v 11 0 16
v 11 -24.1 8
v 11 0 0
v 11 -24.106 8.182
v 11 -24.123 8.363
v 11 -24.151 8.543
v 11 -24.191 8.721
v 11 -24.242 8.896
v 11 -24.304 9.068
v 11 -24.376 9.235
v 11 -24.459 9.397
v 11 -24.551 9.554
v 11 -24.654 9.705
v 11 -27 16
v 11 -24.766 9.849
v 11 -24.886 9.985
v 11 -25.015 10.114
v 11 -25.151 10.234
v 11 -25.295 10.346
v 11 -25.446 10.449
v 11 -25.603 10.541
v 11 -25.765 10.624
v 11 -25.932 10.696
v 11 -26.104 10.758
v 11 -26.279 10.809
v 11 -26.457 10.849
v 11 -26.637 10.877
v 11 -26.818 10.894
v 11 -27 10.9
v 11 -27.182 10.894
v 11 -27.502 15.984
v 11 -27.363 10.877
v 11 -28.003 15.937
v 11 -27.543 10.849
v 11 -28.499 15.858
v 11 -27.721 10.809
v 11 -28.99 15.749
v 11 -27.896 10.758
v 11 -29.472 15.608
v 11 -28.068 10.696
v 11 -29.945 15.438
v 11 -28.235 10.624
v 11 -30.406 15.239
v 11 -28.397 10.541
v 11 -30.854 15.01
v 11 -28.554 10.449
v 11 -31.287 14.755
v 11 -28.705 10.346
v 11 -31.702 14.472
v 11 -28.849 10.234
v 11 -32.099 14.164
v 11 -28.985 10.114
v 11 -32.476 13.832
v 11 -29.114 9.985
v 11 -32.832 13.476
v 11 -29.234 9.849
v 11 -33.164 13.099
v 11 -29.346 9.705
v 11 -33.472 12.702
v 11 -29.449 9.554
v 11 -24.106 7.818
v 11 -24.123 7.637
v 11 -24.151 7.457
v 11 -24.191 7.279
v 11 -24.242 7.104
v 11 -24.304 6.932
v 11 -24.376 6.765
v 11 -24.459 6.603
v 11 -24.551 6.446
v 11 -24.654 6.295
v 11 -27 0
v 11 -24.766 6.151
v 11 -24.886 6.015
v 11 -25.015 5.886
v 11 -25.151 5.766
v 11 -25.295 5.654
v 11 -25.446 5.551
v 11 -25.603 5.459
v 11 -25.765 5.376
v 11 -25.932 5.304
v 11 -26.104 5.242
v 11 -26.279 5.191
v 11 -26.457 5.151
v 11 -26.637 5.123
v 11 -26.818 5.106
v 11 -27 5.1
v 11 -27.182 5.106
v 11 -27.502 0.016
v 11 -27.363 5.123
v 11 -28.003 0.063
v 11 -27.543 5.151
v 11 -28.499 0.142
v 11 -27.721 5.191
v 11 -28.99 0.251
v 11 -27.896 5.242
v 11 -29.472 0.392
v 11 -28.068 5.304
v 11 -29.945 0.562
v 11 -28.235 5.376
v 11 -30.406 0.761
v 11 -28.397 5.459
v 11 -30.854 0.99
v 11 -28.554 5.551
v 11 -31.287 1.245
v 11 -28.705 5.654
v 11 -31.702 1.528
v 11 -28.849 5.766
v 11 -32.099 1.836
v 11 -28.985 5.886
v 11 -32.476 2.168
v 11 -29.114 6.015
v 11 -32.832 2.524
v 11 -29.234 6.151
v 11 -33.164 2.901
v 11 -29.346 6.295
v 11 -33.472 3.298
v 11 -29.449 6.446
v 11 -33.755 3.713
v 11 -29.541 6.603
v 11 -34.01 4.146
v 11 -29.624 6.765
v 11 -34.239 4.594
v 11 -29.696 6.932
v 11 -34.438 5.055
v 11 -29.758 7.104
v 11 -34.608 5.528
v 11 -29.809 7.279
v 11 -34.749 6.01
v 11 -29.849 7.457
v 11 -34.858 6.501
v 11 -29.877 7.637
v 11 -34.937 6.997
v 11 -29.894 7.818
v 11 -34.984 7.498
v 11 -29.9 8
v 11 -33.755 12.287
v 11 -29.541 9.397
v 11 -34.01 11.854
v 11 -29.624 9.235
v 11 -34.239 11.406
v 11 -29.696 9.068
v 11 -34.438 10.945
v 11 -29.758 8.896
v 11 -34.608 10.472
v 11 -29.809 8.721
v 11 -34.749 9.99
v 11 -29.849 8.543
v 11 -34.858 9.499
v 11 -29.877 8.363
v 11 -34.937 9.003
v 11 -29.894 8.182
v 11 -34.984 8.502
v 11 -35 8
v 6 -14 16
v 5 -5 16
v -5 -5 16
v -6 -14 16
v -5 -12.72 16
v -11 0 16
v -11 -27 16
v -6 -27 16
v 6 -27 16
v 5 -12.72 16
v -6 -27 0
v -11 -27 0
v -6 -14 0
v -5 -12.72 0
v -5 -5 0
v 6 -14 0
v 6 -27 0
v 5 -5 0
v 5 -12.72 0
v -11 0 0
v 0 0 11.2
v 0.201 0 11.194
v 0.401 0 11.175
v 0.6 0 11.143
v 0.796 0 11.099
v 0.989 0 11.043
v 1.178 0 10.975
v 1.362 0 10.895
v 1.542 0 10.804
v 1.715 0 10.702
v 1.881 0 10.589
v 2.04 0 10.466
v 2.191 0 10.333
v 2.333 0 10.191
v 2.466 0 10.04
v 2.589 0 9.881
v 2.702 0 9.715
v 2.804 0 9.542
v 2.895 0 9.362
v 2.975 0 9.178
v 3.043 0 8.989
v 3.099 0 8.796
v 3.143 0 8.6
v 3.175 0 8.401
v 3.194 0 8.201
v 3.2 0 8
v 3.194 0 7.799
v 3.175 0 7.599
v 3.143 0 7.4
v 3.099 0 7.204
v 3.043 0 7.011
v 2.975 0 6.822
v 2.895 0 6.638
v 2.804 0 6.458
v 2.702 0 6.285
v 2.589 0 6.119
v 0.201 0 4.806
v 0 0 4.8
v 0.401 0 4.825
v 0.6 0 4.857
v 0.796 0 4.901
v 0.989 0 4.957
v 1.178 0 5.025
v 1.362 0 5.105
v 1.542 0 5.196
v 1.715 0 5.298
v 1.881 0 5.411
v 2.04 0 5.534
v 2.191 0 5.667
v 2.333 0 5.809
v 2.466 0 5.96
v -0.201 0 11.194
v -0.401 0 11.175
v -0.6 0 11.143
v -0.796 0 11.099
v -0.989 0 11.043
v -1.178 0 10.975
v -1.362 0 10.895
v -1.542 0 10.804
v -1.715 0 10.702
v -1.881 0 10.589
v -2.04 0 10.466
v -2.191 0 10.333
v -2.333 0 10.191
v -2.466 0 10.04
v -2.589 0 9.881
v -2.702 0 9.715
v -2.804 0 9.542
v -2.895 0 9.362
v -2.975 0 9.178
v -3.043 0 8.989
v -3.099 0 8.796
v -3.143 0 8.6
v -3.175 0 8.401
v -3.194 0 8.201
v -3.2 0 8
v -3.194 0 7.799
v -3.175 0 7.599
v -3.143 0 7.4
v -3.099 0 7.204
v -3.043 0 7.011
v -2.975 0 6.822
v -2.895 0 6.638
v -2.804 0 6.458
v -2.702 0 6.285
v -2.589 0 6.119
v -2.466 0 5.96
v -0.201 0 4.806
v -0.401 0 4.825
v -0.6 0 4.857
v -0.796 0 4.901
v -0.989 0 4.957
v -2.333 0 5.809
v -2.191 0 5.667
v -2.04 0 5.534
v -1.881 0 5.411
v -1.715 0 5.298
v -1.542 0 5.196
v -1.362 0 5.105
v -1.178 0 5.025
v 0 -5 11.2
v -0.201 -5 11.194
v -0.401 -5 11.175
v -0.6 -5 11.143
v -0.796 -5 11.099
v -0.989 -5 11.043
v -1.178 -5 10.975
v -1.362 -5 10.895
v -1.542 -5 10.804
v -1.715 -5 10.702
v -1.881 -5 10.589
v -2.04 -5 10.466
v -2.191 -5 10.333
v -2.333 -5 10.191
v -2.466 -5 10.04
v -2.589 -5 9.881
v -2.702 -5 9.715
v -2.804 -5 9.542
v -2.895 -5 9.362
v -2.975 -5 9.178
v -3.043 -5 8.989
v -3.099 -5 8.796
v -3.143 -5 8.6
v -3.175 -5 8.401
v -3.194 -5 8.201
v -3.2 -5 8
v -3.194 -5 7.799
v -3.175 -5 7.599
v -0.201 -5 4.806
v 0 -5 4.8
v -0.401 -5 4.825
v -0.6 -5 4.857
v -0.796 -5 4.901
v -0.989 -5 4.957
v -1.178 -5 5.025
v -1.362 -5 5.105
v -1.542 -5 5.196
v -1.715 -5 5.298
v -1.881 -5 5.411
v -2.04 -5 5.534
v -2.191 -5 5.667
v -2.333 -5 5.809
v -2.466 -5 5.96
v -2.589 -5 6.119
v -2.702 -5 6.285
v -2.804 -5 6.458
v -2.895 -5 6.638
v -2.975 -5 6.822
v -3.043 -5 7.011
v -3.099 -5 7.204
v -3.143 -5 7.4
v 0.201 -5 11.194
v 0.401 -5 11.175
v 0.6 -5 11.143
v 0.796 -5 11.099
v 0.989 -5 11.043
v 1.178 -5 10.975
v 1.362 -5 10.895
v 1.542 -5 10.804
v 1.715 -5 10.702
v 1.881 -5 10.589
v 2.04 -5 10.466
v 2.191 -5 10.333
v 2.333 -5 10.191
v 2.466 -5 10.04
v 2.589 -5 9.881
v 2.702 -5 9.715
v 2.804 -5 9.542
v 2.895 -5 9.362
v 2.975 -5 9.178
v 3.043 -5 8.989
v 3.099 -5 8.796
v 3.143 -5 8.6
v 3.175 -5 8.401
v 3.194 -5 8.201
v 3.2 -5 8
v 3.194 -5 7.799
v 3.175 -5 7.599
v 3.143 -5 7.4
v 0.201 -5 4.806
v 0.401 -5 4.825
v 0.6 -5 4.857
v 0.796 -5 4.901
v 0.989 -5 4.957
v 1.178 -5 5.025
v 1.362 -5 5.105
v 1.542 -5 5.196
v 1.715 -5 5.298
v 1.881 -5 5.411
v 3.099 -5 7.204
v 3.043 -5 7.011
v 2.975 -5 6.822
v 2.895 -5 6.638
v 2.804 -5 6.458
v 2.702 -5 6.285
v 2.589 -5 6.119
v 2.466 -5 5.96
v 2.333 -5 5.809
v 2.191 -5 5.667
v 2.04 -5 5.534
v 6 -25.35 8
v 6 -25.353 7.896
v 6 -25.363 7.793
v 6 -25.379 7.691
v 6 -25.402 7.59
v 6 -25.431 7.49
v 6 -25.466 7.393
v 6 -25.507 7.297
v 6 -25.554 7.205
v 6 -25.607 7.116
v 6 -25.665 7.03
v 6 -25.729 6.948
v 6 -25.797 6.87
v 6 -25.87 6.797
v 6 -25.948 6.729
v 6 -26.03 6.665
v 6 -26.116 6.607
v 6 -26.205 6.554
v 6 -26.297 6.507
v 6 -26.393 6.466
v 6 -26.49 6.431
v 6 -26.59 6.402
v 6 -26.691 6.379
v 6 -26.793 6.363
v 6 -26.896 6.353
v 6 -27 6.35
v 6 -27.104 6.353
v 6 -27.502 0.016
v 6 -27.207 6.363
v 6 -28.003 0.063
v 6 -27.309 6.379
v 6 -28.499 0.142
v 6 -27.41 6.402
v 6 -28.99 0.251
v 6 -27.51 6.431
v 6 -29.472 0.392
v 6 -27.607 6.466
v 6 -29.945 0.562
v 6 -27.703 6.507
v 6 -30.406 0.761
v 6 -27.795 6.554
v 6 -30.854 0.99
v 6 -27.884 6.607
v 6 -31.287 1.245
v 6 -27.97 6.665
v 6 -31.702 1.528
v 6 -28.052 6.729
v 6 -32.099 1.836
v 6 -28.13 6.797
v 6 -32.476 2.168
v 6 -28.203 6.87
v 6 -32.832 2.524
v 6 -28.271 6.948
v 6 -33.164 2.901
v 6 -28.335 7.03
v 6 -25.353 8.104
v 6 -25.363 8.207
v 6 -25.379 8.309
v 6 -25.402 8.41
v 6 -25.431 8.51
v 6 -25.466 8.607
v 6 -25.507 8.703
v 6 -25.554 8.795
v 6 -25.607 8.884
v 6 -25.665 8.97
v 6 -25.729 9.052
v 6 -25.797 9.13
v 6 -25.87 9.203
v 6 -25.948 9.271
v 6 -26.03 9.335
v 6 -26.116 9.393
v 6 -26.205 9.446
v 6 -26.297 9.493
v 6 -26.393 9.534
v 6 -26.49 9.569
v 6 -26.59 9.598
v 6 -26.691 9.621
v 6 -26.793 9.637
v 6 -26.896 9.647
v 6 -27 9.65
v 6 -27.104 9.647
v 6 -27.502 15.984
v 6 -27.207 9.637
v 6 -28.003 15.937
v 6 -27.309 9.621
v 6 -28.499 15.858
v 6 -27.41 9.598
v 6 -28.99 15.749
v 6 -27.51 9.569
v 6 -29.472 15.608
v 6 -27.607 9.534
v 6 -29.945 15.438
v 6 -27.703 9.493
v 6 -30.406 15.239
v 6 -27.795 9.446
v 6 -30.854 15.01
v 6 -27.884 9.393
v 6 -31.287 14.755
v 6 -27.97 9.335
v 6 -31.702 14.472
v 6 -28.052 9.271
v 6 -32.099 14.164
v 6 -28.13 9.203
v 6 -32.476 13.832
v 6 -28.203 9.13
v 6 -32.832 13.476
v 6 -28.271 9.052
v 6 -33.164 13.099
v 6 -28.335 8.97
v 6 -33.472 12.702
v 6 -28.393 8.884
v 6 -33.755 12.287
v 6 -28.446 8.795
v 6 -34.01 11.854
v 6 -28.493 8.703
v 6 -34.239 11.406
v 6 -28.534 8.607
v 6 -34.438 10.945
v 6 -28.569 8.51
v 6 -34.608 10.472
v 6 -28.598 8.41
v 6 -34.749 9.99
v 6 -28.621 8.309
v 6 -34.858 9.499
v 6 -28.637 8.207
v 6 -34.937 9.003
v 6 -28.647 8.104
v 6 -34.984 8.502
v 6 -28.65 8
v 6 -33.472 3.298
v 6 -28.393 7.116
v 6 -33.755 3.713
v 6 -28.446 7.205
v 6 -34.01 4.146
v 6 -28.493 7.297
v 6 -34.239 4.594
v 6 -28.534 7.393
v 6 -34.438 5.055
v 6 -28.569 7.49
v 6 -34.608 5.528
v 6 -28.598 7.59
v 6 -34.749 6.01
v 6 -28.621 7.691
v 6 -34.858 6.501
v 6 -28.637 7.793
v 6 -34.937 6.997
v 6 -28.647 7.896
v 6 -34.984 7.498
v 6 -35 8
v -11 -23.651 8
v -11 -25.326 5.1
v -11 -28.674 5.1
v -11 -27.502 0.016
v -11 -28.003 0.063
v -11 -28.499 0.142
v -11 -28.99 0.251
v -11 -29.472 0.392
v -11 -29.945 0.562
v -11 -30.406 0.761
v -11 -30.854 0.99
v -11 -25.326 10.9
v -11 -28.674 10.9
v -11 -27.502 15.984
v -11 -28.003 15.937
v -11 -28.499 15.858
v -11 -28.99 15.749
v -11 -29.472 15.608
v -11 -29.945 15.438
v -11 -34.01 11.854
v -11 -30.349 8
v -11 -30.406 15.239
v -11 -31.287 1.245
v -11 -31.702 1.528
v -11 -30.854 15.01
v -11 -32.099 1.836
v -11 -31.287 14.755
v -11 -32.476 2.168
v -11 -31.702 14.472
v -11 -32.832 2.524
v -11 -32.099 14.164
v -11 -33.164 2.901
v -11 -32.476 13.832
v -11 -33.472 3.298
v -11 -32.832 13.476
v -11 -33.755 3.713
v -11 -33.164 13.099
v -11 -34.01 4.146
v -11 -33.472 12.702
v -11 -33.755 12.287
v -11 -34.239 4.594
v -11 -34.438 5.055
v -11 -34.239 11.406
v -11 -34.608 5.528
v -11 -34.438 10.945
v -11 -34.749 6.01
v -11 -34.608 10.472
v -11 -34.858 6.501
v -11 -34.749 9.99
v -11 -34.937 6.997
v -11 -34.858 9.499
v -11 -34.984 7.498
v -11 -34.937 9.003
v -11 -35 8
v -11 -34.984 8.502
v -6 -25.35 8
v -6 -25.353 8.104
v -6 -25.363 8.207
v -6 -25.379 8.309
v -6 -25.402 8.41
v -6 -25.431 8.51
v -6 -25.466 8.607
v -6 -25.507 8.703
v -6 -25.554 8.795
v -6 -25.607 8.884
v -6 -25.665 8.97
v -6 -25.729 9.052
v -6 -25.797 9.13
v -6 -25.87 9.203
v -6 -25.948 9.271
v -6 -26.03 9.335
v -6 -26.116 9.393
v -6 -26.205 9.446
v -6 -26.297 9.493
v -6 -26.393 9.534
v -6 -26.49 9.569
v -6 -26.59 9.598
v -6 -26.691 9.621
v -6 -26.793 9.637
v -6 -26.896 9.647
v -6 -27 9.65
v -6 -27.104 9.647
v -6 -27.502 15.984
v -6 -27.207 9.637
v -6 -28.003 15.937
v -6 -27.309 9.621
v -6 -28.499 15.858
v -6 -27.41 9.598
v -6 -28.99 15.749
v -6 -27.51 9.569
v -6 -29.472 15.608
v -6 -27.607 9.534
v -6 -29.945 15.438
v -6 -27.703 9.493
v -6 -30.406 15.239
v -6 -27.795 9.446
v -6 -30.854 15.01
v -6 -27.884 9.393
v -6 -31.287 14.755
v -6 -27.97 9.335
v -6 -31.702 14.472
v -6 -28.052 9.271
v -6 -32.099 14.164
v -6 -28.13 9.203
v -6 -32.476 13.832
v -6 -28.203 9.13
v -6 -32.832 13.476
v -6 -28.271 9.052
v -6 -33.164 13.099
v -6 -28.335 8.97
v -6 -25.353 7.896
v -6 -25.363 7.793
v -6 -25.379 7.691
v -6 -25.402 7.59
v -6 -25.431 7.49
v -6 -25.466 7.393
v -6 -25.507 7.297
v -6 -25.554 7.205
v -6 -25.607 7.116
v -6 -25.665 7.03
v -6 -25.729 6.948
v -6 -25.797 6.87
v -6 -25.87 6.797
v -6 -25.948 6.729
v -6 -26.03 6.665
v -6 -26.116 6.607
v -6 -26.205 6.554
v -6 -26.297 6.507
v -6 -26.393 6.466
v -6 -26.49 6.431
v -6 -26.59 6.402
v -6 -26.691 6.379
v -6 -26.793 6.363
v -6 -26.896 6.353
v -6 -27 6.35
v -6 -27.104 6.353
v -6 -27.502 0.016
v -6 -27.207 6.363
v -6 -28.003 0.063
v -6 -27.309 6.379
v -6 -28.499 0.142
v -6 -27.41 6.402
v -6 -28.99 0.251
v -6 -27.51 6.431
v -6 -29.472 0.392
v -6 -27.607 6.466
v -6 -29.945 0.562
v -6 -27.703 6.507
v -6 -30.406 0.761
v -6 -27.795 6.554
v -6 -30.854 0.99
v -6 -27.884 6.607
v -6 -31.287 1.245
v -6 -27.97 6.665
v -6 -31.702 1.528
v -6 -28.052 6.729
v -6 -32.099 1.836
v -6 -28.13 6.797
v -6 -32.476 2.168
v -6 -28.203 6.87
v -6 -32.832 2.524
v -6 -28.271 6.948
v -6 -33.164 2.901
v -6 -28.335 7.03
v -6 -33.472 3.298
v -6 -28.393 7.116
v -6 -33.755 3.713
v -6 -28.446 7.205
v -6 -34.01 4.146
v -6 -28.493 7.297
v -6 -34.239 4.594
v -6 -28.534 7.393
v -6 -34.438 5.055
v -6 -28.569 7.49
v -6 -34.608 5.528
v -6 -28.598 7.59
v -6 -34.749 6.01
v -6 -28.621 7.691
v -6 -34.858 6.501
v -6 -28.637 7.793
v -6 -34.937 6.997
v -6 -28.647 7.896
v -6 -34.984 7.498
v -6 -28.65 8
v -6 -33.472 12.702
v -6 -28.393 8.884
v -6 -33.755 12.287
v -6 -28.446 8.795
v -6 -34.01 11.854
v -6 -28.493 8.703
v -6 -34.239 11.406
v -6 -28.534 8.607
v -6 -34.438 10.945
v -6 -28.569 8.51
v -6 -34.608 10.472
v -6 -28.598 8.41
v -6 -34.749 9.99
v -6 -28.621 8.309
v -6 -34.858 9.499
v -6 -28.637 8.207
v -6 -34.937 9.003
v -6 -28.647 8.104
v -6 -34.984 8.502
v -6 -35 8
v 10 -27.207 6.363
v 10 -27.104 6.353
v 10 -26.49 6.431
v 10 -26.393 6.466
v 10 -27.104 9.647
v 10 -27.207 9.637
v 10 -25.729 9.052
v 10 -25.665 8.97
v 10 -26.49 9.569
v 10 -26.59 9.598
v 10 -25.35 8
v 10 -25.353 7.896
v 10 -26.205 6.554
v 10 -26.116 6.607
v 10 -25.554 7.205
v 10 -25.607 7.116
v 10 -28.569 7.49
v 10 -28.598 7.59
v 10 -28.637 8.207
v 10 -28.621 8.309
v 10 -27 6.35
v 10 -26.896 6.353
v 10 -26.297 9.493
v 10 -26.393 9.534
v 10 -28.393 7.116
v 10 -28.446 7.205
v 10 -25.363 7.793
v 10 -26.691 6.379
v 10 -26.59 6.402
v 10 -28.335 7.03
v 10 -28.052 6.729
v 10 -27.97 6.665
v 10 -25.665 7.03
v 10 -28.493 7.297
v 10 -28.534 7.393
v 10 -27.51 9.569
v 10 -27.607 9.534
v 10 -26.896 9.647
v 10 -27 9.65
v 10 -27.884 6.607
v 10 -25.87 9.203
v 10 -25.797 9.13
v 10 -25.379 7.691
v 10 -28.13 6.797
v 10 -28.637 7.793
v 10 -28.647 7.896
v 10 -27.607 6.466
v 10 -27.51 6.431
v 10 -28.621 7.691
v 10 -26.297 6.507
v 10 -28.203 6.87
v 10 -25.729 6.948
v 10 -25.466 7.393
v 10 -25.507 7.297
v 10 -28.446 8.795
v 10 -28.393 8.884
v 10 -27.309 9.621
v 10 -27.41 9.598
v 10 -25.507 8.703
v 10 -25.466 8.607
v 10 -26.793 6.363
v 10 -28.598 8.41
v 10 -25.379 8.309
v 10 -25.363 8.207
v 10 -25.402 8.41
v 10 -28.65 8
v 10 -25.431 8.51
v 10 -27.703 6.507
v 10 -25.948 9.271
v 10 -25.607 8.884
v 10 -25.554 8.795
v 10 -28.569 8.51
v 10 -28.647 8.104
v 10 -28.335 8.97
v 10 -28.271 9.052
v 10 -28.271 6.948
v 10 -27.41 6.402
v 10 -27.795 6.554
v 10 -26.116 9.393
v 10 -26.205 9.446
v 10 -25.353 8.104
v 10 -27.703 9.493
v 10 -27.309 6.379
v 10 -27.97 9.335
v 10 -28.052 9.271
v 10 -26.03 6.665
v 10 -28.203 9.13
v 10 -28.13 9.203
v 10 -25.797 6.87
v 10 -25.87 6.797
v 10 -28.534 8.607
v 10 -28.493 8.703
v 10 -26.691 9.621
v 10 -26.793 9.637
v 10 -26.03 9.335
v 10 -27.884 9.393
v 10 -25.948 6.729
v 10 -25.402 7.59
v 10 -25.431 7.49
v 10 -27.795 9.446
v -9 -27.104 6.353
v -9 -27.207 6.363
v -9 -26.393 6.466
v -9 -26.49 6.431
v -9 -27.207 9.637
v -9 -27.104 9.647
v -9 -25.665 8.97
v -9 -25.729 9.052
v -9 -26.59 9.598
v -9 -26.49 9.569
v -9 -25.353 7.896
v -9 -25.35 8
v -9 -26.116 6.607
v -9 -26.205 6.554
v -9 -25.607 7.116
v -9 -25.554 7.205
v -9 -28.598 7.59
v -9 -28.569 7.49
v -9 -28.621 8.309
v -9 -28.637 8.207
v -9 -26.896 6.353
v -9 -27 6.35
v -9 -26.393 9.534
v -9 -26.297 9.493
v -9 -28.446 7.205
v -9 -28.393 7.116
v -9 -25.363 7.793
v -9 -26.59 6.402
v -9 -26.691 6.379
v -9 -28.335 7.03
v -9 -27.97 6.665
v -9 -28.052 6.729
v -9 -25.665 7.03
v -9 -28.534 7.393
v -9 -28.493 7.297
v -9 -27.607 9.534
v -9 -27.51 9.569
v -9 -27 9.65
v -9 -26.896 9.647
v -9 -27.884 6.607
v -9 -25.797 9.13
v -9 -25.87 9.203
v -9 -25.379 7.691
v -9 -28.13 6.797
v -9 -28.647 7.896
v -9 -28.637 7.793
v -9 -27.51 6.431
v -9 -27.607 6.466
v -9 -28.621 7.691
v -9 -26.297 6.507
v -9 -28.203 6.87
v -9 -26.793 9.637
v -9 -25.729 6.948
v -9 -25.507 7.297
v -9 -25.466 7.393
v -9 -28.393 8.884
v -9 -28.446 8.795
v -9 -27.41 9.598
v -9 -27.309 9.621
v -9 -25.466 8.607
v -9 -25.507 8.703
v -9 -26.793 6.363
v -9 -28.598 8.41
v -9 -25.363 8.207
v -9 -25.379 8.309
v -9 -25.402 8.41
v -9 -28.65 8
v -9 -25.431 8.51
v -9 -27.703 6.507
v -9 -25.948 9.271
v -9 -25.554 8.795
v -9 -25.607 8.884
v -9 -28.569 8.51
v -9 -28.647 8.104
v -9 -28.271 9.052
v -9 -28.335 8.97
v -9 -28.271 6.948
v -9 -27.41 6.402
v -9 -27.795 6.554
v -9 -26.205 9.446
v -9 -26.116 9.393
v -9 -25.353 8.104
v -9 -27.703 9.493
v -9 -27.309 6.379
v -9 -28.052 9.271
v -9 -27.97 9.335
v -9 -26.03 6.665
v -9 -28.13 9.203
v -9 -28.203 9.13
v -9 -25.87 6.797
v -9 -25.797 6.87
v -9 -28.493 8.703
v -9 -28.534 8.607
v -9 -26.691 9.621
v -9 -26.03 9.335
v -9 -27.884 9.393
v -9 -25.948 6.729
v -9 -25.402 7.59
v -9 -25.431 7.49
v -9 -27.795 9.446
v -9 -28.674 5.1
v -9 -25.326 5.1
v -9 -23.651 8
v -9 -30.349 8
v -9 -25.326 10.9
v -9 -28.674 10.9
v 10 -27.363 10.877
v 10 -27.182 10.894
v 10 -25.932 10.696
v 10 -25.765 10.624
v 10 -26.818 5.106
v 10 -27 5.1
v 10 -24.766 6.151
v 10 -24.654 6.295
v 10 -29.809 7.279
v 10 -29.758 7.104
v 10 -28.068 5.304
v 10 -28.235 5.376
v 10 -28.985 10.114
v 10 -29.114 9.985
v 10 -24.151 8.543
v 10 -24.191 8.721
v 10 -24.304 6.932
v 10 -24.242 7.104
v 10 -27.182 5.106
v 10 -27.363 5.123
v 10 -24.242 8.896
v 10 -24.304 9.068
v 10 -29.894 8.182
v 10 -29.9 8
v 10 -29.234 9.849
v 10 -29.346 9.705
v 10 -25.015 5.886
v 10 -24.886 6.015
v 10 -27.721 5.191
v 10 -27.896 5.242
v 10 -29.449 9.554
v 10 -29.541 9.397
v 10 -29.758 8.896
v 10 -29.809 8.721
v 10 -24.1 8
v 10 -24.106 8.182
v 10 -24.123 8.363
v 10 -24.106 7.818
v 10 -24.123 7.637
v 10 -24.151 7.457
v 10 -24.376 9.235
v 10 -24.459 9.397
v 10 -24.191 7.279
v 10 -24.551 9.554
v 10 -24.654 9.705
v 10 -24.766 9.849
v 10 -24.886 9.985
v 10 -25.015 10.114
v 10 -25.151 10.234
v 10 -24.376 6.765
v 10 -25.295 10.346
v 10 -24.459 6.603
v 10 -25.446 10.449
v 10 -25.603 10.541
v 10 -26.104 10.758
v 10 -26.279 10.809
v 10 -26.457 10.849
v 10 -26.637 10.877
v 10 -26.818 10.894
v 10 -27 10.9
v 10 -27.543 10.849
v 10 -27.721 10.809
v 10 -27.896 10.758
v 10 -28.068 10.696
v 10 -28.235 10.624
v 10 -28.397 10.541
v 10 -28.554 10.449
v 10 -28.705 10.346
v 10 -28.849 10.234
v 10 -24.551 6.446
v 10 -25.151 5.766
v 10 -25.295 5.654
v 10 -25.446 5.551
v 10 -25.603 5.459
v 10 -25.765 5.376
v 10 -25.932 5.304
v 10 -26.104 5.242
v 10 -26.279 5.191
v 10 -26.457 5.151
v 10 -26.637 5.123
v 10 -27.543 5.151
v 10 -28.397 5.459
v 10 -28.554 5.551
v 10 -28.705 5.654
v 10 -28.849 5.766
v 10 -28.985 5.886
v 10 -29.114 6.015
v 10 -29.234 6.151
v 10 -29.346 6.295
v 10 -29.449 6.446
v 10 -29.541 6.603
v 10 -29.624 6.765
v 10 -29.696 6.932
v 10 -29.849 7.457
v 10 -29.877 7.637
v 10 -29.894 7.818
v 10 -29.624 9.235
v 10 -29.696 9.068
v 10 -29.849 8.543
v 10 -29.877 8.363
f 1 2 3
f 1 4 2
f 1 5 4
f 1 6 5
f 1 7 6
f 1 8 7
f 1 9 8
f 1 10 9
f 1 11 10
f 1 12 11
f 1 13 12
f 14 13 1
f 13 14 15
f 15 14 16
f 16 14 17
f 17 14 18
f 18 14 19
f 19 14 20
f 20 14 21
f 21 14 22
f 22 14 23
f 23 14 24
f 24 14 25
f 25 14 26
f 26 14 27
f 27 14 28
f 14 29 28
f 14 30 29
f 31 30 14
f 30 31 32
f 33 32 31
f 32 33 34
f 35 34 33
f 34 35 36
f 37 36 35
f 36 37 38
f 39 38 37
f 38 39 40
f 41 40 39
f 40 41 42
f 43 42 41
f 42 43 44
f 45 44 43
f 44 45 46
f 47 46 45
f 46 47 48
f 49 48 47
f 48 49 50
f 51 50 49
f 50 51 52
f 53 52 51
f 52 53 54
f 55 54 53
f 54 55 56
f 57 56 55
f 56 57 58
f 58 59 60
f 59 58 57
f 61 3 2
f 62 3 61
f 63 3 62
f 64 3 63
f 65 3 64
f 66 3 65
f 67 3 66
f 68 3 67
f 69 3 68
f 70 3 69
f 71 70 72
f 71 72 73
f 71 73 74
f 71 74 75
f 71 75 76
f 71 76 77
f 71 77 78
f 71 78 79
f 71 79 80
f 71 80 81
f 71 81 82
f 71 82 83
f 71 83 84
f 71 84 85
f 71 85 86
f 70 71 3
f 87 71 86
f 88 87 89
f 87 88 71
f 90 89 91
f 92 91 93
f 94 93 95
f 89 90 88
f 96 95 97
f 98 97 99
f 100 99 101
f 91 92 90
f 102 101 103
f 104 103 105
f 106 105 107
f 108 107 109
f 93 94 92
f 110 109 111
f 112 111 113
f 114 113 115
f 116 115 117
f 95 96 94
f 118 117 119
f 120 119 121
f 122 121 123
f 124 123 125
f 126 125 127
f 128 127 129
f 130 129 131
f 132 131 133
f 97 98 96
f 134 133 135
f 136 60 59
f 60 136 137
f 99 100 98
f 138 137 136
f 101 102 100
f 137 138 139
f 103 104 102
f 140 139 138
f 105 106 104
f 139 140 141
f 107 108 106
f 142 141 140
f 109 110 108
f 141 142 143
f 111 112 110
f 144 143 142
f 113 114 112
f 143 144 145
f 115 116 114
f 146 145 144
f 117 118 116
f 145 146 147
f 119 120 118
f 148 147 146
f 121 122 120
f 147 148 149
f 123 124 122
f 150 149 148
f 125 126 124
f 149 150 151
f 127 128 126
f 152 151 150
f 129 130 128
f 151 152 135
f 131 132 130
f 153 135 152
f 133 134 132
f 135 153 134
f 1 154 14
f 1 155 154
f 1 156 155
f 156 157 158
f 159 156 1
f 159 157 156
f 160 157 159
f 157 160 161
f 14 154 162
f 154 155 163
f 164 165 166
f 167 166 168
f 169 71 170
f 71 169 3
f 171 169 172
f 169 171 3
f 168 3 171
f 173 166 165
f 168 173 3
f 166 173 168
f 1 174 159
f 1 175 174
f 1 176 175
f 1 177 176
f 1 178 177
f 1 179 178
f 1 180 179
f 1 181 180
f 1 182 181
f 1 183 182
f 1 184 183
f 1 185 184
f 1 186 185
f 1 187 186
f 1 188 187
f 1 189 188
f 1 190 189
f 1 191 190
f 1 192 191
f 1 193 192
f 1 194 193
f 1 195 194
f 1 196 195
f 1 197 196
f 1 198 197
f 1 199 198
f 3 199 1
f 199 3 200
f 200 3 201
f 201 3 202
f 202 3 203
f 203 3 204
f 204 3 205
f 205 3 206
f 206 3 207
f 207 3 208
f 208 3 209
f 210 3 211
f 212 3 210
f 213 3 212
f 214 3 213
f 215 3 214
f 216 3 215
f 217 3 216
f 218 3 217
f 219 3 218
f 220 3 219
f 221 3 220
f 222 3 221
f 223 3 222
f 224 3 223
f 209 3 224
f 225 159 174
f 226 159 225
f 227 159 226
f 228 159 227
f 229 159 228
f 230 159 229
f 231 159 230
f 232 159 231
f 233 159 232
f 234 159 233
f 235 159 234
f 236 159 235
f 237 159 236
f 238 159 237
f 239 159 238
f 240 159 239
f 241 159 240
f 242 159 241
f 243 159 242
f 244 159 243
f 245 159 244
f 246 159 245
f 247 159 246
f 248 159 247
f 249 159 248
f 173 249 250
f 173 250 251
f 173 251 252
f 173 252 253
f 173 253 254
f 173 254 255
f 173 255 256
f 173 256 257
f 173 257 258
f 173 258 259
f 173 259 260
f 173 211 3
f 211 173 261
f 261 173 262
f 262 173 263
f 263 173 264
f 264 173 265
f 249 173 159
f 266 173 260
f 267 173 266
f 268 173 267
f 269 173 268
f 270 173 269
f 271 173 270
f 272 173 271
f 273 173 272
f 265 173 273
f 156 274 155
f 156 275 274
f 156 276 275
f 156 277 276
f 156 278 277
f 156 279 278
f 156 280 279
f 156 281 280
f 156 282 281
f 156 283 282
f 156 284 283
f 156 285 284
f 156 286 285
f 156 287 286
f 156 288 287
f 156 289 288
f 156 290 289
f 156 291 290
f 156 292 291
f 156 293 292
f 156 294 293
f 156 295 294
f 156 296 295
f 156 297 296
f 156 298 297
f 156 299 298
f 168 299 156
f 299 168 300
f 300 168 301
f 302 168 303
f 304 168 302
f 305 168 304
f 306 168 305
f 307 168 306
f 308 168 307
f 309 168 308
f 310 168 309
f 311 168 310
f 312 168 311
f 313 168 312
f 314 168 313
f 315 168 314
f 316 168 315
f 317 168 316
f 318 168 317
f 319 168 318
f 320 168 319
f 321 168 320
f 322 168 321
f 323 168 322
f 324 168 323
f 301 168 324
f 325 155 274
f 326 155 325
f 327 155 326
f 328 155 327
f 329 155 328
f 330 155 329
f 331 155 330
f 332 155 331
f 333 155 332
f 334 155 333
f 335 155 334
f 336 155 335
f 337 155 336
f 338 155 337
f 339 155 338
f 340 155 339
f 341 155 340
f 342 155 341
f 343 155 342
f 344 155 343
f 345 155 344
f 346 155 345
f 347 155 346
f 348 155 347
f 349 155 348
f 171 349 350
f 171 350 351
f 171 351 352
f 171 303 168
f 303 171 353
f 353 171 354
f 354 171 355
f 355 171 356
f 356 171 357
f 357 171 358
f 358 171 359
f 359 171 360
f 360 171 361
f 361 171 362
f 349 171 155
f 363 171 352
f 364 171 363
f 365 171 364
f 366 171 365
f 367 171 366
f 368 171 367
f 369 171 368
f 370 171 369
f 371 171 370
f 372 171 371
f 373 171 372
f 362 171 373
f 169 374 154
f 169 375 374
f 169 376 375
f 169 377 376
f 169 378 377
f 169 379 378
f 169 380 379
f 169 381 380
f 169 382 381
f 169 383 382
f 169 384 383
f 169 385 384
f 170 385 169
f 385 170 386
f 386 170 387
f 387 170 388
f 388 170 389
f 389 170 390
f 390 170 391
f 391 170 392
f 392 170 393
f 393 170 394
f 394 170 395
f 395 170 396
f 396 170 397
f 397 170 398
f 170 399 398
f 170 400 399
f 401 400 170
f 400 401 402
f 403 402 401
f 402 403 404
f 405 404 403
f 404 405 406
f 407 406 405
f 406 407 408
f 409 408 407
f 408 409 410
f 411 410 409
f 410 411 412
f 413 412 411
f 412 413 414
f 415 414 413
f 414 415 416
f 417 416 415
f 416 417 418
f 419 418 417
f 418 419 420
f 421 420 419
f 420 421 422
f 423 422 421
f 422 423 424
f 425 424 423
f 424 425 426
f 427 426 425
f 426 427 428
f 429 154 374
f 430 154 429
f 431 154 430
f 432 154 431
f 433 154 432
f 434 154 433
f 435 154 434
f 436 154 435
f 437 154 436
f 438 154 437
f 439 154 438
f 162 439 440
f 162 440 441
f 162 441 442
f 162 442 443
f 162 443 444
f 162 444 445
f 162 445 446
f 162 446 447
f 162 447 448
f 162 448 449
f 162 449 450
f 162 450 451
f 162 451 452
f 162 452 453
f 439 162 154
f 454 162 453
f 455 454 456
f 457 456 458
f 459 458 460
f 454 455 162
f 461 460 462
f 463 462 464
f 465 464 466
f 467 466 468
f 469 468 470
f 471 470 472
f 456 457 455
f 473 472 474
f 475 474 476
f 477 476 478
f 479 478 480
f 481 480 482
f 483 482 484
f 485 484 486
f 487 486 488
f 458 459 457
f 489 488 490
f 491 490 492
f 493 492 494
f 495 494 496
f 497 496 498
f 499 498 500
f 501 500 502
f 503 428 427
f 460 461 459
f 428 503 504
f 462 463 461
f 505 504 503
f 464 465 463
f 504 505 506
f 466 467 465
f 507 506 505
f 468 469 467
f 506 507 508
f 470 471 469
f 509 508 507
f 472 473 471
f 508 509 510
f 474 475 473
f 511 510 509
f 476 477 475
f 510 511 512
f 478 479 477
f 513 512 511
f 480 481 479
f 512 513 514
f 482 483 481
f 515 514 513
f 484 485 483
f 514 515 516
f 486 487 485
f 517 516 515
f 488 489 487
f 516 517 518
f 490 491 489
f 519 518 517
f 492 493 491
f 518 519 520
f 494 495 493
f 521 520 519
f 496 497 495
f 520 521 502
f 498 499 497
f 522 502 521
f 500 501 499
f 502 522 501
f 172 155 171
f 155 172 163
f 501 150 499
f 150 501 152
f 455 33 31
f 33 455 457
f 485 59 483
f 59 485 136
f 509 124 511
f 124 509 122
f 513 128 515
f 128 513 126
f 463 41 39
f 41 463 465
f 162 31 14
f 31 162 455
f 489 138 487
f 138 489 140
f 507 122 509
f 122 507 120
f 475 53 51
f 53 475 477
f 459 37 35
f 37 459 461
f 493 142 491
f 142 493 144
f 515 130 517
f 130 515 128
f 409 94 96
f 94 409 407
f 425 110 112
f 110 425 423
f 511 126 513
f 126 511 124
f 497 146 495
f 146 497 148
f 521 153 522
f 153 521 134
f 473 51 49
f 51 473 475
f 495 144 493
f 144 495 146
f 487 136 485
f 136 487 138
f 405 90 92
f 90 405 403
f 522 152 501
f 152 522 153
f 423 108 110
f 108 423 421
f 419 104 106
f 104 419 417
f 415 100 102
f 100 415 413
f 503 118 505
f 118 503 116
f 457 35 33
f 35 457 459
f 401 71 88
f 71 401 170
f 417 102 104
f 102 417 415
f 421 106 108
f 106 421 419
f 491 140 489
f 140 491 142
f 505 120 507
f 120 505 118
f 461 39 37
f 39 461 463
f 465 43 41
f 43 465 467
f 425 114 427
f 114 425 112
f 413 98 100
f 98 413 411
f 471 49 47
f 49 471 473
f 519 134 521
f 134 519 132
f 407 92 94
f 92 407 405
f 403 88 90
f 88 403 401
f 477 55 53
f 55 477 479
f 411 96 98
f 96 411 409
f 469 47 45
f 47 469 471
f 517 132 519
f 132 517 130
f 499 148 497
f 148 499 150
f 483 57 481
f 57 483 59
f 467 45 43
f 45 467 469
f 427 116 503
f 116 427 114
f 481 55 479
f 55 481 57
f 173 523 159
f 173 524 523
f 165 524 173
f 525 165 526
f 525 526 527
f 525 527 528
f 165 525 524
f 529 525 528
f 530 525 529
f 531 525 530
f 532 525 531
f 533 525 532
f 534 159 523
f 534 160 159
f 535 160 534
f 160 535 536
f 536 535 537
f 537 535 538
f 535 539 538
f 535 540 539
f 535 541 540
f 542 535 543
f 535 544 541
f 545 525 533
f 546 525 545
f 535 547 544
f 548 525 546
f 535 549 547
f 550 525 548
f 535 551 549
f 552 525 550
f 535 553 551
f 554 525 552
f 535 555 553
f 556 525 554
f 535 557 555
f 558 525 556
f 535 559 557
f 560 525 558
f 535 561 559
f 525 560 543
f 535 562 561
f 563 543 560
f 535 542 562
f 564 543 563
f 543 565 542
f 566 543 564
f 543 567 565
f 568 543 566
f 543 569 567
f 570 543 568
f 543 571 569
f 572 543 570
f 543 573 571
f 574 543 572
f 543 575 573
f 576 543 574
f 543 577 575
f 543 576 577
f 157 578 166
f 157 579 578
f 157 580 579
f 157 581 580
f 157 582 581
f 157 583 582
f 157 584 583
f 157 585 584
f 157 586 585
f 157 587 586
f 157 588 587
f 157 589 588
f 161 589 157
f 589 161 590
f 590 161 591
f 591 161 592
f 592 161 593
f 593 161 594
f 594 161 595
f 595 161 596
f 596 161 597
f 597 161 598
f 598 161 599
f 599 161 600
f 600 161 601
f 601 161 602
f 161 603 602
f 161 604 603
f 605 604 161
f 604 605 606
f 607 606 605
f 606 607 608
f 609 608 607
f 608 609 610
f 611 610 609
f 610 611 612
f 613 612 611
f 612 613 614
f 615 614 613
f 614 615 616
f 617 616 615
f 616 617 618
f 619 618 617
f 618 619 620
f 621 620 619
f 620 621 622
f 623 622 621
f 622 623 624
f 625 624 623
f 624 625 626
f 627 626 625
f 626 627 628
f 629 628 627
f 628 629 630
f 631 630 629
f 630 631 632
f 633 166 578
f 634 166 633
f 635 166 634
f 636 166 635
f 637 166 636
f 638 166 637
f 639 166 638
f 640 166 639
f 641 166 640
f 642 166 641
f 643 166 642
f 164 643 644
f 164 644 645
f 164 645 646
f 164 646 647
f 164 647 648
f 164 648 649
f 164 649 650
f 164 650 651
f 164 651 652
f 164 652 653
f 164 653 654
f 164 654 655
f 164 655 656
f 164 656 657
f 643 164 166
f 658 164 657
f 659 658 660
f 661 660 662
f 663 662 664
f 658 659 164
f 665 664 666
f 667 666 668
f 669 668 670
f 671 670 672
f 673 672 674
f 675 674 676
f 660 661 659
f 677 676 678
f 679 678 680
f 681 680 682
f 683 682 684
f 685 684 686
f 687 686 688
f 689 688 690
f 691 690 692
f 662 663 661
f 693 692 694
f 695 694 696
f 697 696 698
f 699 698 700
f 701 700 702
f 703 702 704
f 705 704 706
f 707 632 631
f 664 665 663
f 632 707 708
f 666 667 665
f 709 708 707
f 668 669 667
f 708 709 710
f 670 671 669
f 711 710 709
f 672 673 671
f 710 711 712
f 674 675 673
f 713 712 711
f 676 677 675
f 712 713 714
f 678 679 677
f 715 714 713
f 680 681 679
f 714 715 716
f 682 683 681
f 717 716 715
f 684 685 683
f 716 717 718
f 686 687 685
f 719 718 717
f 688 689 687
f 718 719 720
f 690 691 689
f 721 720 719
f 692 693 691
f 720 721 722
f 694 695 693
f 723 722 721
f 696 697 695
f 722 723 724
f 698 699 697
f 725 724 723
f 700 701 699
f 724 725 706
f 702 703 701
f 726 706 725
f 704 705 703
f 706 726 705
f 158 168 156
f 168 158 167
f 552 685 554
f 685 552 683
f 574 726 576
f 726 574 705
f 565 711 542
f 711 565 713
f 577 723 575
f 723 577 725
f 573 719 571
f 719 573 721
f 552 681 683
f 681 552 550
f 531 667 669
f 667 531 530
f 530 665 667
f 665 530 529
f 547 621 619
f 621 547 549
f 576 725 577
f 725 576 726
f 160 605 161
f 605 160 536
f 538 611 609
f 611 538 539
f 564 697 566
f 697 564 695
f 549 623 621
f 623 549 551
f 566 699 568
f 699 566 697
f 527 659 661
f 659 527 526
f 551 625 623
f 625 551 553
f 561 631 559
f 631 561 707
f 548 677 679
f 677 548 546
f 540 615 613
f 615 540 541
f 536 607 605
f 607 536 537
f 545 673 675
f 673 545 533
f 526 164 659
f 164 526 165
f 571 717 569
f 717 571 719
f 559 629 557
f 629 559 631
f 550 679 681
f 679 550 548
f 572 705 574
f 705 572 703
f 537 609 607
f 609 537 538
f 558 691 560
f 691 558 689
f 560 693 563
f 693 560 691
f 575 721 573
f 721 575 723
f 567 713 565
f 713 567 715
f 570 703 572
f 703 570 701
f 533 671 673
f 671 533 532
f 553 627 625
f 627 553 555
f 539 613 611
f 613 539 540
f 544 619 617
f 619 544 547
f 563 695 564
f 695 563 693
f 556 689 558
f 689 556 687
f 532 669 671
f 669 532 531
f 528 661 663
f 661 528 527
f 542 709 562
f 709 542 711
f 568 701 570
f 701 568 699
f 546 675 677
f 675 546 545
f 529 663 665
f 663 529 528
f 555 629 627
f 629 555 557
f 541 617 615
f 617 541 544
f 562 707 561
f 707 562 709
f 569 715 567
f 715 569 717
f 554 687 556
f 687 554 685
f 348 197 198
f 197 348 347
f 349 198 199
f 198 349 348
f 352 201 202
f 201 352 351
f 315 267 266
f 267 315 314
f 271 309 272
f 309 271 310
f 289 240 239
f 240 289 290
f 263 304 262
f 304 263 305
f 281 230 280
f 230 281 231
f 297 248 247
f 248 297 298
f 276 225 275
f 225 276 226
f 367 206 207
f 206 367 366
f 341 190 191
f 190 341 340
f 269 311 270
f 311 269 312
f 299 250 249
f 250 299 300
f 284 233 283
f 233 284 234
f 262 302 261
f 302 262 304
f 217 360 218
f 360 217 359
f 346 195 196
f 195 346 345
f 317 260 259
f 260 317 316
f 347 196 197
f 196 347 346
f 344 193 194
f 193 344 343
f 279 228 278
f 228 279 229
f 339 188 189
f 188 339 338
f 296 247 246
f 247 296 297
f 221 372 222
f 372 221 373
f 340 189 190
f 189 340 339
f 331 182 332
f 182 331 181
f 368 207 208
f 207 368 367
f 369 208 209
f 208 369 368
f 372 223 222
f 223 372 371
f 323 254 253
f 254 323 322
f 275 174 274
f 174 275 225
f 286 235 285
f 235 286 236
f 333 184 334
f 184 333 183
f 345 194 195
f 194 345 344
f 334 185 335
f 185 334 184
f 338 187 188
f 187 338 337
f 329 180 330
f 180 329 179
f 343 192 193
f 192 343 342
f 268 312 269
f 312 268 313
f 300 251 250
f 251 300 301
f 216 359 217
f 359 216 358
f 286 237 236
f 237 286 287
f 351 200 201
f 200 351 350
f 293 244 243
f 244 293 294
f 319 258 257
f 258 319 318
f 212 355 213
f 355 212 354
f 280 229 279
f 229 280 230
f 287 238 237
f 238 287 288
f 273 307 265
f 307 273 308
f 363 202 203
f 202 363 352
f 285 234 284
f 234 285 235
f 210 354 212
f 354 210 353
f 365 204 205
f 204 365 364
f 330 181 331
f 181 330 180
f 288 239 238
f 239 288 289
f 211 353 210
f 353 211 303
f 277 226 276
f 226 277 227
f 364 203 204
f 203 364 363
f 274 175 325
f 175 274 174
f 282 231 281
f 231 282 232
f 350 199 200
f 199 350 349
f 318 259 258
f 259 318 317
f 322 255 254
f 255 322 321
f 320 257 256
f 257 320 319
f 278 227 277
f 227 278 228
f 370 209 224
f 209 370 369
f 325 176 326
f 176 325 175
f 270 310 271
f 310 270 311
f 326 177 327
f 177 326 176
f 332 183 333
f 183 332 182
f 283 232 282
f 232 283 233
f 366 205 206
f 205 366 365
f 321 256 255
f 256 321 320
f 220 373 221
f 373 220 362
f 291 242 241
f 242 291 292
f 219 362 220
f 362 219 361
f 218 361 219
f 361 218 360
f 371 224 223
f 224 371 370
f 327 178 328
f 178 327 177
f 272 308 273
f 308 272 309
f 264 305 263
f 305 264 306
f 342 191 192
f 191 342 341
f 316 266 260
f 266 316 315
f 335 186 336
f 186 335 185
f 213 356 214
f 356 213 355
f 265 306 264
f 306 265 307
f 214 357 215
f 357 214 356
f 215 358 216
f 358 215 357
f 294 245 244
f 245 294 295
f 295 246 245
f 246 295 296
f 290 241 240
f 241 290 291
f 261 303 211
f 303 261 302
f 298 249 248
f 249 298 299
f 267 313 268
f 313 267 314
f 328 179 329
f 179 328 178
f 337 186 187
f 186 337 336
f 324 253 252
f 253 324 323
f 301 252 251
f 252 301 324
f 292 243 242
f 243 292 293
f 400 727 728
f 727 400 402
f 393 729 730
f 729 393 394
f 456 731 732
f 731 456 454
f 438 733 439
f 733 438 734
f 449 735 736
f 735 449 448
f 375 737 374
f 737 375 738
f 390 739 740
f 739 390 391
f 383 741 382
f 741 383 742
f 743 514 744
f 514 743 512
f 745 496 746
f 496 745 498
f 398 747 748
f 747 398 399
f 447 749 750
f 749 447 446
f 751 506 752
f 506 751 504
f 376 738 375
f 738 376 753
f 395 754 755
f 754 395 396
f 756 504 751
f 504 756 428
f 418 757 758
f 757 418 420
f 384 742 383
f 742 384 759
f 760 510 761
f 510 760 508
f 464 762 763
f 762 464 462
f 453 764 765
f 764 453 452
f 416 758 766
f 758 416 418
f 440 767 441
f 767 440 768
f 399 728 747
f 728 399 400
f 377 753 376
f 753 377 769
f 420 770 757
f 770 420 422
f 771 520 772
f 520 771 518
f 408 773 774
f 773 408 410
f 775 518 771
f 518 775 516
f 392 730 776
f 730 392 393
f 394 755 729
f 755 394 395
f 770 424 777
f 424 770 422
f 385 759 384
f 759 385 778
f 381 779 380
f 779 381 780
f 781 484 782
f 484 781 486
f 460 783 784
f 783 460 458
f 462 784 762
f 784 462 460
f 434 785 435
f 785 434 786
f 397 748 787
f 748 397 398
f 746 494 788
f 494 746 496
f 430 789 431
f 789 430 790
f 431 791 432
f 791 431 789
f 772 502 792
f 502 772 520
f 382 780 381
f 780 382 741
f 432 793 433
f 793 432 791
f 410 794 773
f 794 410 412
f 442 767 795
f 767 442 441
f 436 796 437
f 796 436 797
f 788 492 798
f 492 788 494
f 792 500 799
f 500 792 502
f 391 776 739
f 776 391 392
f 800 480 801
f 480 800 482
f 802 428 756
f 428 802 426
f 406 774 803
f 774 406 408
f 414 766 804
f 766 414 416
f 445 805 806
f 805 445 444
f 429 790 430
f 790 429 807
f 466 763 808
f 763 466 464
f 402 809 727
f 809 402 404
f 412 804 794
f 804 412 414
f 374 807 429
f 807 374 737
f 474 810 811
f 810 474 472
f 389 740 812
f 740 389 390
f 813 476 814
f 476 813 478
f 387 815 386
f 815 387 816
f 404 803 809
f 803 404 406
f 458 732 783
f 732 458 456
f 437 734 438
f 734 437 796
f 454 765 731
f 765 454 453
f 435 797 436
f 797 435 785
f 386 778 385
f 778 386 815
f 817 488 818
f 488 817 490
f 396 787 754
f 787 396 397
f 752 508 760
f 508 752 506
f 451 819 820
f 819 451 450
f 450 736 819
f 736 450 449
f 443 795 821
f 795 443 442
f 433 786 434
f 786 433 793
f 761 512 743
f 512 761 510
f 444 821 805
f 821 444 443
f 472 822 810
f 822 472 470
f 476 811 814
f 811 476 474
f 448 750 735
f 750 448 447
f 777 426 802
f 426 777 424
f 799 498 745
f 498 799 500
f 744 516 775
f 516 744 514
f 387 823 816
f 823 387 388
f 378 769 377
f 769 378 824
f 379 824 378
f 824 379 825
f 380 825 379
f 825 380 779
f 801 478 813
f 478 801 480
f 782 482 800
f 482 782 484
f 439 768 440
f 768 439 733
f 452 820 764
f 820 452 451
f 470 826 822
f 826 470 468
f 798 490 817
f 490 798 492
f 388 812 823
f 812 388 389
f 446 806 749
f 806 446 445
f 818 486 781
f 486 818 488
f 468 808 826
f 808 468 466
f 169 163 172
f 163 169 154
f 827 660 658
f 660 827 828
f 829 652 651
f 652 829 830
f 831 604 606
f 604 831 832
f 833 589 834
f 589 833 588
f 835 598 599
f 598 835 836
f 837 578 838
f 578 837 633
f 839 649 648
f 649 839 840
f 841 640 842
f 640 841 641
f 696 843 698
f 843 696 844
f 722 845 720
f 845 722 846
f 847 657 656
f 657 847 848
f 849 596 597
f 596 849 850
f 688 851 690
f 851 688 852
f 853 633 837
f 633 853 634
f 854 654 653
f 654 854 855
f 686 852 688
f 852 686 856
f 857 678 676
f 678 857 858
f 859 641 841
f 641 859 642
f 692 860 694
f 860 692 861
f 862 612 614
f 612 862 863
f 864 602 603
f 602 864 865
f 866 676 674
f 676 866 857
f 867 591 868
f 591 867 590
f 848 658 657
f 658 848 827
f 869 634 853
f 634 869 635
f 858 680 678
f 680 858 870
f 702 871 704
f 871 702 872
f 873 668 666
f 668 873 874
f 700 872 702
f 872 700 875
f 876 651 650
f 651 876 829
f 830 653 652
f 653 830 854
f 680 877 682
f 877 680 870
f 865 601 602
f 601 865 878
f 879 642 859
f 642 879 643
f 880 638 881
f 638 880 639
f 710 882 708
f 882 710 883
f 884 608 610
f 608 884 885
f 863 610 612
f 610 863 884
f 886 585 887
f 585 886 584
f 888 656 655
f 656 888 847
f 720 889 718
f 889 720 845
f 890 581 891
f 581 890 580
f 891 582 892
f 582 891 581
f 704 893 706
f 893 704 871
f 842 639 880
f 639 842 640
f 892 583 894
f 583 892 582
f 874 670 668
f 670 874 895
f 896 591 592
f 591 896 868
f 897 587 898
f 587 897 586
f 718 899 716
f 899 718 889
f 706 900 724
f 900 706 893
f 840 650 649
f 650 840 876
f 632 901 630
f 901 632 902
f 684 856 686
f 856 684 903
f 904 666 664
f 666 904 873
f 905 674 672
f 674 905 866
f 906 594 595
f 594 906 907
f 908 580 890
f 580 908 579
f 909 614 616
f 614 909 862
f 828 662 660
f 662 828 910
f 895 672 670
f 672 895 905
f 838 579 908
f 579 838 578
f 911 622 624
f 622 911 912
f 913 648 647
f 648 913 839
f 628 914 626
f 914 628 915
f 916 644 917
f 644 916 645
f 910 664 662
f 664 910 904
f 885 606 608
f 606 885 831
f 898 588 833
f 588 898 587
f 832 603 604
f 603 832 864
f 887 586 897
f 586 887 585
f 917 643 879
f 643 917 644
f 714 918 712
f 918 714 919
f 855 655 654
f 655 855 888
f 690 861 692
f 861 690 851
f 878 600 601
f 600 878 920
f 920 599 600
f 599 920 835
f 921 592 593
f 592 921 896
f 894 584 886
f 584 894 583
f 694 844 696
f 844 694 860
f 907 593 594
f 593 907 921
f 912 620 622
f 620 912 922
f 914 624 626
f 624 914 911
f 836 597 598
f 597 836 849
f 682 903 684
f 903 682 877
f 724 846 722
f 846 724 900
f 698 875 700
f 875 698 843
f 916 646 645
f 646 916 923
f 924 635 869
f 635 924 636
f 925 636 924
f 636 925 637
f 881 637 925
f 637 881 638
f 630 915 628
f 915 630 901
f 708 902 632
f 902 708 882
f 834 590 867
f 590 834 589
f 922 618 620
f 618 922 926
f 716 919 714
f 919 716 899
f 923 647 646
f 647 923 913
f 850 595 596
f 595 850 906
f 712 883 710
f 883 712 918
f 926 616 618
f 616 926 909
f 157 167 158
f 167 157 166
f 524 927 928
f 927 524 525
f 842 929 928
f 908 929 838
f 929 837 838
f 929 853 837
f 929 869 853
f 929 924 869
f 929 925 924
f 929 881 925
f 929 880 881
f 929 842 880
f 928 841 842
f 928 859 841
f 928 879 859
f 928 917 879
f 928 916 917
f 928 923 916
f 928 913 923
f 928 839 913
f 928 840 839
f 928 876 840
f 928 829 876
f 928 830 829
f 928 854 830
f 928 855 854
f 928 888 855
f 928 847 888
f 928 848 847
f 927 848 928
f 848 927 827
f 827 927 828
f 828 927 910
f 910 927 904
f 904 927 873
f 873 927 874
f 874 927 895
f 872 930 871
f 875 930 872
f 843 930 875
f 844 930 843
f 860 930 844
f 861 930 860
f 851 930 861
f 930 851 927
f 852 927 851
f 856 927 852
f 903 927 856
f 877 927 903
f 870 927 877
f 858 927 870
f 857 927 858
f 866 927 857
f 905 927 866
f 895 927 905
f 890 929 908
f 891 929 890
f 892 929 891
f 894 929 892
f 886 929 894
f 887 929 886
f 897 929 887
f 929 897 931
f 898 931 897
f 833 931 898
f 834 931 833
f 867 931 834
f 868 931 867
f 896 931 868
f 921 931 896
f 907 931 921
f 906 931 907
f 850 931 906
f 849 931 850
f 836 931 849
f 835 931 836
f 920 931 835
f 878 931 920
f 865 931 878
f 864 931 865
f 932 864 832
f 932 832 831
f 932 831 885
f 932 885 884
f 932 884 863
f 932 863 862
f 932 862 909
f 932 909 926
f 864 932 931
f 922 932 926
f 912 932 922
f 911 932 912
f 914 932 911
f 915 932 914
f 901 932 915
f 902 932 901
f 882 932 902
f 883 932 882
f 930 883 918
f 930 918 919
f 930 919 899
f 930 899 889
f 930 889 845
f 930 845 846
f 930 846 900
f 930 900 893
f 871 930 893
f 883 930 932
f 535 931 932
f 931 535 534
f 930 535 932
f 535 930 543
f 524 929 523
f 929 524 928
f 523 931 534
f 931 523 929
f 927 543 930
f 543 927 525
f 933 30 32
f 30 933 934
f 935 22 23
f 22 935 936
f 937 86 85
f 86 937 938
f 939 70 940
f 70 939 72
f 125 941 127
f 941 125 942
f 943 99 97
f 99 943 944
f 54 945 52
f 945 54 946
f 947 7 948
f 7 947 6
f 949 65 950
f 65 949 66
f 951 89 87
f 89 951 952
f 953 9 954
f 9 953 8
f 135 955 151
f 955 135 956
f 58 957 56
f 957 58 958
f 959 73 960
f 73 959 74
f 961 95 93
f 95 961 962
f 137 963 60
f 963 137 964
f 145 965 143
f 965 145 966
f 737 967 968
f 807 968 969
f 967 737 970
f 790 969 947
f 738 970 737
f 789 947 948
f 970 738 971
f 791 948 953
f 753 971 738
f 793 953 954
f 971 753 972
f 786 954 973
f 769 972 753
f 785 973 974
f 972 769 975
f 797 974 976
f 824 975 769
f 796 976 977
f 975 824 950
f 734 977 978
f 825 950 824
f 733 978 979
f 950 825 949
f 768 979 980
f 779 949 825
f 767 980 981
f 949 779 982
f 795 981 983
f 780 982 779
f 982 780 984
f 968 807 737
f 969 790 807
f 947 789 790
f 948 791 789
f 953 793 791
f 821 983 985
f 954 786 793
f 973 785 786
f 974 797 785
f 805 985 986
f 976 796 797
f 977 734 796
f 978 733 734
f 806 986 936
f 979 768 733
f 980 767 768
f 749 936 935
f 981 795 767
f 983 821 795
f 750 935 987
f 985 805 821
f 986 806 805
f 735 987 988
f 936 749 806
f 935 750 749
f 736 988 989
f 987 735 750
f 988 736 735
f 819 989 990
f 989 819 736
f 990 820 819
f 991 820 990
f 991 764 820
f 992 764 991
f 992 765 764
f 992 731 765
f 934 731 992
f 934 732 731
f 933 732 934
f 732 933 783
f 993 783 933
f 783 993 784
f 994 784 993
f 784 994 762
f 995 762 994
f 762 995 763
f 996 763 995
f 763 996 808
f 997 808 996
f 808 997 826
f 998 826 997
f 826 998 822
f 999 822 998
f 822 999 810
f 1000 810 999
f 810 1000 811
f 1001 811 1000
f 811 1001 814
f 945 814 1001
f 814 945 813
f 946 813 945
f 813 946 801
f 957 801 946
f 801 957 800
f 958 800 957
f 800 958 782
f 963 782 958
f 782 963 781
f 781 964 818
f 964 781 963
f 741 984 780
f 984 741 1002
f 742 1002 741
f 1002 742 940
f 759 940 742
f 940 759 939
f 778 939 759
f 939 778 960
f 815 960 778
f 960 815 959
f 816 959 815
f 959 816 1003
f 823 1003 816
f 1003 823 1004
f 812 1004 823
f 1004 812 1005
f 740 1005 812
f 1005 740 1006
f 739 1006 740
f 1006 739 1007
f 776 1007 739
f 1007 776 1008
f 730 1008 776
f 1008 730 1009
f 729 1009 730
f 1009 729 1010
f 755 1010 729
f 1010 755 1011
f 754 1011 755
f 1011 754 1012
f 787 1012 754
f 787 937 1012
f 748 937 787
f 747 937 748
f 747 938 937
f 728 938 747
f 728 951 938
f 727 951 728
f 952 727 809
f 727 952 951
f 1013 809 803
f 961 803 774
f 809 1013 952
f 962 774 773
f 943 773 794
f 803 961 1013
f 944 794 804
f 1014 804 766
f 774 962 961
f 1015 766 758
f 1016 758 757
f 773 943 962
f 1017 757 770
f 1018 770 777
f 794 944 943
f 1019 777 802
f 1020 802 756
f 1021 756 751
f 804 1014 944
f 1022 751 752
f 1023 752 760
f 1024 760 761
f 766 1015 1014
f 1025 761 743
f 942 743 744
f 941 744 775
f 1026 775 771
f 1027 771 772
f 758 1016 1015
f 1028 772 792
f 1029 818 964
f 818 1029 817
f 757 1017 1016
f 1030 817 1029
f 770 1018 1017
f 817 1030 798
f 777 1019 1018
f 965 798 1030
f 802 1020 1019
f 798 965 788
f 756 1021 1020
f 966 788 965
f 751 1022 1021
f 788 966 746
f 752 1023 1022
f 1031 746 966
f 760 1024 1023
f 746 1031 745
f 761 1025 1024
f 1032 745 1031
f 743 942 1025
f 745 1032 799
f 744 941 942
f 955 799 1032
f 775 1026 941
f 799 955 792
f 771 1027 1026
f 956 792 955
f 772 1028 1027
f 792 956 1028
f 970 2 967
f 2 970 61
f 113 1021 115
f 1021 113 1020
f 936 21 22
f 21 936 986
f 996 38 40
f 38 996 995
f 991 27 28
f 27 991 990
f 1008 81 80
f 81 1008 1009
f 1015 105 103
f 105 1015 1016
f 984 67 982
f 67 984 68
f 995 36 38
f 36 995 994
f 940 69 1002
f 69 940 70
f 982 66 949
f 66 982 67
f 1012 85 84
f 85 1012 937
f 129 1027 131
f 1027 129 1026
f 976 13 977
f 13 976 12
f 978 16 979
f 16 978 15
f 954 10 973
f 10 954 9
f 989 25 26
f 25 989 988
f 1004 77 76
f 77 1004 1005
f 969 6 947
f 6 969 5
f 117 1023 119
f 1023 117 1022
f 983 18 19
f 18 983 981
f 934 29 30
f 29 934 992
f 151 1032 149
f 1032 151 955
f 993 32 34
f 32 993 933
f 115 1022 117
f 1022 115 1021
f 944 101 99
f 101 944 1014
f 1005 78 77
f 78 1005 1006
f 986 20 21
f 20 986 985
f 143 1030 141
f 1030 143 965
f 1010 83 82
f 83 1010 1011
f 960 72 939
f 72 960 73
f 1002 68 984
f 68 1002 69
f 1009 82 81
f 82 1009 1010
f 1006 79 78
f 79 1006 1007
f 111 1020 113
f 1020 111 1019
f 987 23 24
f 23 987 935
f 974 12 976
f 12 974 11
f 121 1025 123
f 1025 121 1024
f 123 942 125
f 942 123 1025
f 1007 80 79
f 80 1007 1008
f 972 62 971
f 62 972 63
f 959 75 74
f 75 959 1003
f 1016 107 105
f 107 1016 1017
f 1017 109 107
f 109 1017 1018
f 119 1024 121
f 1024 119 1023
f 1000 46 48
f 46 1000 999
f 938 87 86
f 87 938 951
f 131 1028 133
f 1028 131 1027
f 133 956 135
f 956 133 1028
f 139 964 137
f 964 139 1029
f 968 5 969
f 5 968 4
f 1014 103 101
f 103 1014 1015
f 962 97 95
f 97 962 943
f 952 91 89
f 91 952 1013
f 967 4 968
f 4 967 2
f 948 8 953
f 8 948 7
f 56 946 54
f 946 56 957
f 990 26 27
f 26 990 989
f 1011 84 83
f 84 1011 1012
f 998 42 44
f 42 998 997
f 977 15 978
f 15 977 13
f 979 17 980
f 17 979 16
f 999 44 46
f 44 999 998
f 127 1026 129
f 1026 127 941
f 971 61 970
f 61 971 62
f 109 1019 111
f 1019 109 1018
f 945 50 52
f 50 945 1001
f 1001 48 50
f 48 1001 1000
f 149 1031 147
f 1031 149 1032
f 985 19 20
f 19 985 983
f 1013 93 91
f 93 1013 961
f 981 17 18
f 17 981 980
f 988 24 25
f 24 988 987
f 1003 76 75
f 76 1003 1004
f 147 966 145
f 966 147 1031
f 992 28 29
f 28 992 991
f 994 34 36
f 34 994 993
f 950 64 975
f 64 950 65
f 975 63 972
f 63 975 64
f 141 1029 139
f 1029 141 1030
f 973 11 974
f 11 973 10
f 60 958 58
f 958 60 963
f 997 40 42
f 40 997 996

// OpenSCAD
// Created from Code_Yidler_623.stl
// https://github.com/Mecan0/Code
// By J.Rodigo (www.jra.so)
// Licence Creative commons atribution & share alike.

/**************************/
// Parámetros de la pieza  /
/**************************/

dTal = 6.4;		// Diámetro del taladro (Soporte) (6.4)

//Características del tornillo (Polea)
dTor = 3.3;		// Diámetro de la rosca (3.3)
dCab = 5.8;		// Diámetro de la cabeza (5.6)
hHex = 5.8;		// Altura entre caras planas de la tuerca (5.8)


// Media pieza
module mpieza(){
	// Bloque a lo largo del eje X
		translate([0, -5, 0])
		cube([11, 5, 16]);

	//	Bloque a lo largo del eje Y
	//	Bloque grande
		translate([6, -27, 0])
		cube([5, 27, 16]);
	//	Bloque pequeño
		translate([5, -14, 0])
		cube([1, 9, 16]);	
	//	Redondeo
		translate([6, -27, 8])
		rotate( 90, [0, 1, 0])
		cylinder(h = 5, r = 8, $fn=100);
}

// Operaciones para media pieza
module moperaciones(){
	// Taladro del soporte
	translate([0, 1, 8])
	rotate( 90, [1, 0, 0])
	cylinder(h = 7, r = dTal/2, $fn=100);
	// Taladro para la polea
	translate([5, -27, 8])
	rotate( 90, [0, 1, 0])
	cylinder(h = 7, r = dTor/2, $fn=100);
	// Chaflán interior
	translate([6, -14, -1])
	rotate( 232, [0, 0, -1])
	cube([2, 1, 18]);
}

// Generar un hexágono circunscrito (Diámetro,Altura) 
module hexagono(d,h){ 
	for (a = [0, 60,120]){ 
		rotate( a, [0, 0, 1])
		cube([d, d*tan(30), h], center = true);
	}
}

// Alojamiento de la cabeza del tornillo 
module tcab(){ 
	translate([10, -27, 8])
	rotate( 90, [0, 1, 0])
	cylinder(h = 2, r = dCab/2, $fn=100);
}

// Alojamiento de la tuerca
module tuerca(){ 
	translate([-11, -27, 8])
	rotate( 90, [0, 1, 0])
	hexagono(hHex, 4);

}
// Creamos la pieza a partir de las operacione
module pieza(){
	difference () {
		union() {
			// Pieza situada en {+X,-Y,+Z}
			mpieza();	
		
			// Pieza simétrica situada en {-X,-Y,+Z}
			mirror([ 1, 0, 0 ])
			mpieza();
		}	
		union() {
			// Operaciones situadas en {+X,-Y,+Z}
			moperaciones();
	
			// Operaciones simétricas situadas en {-X,-Y,+Z}
			mirror([ 1, 0, 0 ])
			moperaciones();

		// Operaciones únicas para cada lado
			// Vaciado para la cabeza del tornillo
			tcab();
			// Vaciado para la tuerca hexagonal 
			tuerca();
		}	
	}
}

// Generamos la pieza!!

	pieza();
